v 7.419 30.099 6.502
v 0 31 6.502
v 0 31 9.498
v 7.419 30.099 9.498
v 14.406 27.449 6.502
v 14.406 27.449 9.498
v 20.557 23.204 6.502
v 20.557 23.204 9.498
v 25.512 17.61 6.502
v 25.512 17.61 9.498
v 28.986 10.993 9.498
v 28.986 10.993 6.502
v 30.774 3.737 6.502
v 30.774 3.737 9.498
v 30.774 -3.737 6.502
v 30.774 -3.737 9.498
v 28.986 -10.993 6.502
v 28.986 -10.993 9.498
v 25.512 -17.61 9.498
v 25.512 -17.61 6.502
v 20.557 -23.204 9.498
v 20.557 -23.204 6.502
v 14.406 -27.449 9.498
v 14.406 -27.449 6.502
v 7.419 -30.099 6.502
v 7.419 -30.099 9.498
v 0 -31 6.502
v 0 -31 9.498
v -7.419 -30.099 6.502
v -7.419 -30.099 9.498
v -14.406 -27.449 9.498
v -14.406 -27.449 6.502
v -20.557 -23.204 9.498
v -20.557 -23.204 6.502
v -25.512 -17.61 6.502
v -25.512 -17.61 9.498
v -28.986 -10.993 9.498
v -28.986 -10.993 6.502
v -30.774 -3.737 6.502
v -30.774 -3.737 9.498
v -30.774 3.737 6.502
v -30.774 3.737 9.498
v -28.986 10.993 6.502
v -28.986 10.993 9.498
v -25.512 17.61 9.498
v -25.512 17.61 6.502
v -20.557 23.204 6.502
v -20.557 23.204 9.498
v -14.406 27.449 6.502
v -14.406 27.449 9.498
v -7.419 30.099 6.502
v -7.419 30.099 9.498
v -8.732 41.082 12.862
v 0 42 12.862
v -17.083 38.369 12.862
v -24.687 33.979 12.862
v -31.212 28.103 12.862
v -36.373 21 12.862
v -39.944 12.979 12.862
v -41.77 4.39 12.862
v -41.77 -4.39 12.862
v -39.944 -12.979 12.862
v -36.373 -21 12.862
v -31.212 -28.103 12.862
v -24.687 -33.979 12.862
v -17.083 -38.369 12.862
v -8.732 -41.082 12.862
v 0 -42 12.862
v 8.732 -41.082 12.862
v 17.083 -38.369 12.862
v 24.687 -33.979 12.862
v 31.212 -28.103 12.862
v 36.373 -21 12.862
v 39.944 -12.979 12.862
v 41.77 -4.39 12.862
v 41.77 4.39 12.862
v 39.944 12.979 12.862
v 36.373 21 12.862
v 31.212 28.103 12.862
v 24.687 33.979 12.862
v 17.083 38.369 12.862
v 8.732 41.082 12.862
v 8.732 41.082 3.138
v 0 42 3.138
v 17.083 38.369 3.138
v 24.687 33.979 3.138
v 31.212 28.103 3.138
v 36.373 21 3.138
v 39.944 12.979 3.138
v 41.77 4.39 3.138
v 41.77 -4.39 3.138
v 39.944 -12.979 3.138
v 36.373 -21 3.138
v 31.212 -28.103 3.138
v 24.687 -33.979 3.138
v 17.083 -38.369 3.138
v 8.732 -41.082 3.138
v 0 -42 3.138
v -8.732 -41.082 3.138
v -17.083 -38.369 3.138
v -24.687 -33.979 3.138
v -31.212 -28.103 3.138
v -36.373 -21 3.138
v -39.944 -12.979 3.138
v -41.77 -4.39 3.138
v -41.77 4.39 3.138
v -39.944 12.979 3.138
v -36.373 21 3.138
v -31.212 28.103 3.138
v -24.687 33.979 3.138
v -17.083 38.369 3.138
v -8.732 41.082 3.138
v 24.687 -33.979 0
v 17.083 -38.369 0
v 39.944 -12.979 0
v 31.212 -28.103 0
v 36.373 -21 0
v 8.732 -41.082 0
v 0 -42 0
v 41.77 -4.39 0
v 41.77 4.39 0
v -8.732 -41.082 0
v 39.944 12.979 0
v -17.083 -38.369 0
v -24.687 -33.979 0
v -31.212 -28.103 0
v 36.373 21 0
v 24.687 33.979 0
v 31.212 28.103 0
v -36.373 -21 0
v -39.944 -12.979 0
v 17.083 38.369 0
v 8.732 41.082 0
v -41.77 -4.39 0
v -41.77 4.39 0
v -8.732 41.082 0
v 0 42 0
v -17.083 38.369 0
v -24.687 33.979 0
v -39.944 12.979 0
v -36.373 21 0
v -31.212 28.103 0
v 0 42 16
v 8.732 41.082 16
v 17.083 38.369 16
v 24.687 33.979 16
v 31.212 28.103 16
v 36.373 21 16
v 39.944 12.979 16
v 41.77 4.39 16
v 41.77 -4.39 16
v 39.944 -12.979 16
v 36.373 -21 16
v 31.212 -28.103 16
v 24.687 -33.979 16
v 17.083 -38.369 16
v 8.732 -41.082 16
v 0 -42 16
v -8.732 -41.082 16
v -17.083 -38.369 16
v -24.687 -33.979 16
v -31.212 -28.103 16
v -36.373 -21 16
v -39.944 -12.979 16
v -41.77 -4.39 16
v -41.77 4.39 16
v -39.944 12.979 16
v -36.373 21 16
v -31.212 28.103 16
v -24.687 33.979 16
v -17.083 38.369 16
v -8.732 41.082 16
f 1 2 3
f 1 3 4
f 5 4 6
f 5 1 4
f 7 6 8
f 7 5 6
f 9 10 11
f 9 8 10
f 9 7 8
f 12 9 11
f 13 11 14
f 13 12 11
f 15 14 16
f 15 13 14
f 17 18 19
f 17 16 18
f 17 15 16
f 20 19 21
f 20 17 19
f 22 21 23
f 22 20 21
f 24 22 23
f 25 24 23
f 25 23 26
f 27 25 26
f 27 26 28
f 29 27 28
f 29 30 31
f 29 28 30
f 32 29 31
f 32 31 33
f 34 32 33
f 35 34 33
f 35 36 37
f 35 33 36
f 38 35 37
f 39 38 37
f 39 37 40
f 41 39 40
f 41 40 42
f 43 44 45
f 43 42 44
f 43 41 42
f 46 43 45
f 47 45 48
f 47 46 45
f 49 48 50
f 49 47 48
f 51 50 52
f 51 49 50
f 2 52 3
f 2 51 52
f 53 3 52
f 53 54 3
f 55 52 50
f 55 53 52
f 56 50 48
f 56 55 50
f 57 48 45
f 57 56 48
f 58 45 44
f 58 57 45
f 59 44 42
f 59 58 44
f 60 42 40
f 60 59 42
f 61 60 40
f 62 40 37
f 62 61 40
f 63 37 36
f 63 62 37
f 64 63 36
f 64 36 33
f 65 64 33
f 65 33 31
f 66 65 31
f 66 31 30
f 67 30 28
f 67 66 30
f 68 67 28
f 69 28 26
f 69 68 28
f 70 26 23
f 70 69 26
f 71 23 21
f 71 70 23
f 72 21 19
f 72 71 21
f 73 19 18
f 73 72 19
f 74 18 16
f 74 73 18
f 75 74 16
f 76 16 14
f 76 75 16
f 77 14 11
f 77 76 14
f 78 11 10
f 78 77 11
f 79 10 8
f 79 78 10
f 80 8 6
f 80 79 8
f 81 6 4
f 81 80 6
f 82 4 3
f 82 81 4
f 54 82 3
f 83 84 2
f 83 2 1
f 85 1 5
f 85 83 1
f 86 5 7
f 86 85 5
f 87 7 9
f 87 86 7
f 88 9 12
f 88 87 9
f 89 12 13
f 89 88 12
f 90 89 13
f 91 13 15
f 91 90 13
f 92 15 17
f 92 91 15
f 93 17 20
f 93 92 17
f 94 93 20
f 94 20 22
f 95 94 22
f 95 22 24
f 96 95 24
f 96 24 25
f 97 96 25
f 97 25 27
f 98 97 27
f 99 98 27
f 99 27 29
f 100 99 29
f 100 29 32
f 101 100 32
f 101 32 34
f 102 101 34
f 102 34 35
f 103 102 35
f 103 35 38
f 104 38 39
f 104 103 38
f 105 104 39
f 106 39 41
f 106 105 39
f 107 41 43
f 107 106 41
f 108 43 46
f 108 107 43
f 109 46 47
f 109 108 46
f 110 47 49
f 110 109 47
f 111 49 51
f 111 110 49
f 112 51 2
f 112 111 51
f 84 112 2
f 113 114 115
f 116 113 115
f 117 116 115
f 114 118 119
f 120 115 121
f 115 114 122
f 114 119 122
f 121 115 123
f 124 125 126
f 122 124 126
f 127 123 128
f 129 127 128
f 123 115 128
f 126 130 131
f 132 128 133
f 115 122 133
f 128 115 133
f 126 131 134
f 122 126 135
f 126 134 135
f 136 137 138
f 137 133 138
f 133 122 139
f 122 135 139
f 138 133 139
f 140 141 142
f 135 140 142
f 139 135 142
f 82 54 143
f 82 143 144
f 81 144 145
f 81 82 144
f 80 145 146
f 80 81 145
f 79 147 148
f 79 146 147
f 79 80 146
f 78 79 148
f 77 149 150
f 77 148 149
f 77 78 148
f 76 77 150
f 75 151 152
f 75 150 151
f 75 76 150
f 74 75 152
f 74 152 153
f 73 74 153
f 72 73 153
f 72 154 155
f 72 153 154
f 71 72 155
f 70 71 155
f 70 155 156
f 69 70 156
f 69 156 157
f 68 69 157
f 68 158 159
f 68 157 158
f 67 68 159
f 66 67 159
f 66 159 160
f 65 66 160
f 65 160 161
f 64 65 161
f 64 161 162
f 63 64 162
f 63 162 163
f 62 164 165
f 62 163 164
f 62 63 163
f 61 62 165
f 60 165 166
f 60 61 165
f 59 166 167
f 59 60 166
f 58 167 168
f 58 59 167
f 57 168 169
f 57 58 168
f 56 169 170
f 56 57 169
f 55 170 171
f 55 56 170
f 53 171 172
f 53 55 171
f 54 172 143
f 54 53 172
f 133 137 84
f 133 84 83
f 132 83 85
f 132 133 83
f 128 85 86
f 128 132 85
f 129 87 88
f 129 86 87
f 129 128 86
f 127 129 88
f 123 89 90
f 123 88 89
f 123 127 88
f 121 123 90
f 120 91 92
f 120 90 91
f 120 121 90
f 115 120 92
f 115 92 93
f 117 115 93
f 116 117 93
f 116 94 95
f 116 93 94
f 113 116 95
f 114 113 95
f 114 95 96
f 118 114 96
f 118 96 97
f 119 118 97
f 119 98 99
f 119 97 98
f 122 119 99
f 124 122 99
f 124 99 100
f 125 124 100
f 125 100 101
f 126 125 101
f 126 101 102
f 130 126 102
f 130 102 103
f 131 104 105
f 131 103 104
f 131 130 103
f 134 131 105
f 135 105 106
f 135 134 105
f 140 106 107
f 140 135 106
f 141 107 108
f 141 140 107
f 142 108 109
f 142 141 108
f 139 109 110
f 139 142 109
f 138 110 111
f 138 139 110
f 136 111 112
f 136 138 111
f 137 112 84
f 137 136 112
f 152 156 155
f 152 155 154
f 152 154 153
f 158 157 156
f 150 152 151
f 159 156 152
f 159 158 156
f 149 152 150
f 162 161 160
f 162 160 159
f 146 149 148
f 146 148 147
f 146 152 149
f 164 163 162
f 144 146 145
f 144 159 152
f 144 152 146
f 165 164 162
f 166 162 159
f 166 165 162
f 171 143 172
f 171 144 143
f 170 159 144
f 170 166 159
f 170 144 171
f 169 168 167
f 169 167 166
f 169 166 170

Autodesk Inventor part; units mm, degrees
ref_plane "YZ Plane" through (0, 0, 0) normal (1, 0, 0) x (0, 1, 0)
ref_plane "XZ Plane" through (0, 0, 0) normal (0, 1, 0) x (-1, 0, 0)
sketch "Main Sketch" plane through (0, 0, 0) normal (1, 0, 0) x (0, 1, 0)
  line L0 (0, 16) -> (42, 16)
  line L1 (42, 16) -> (42, 12.8615)
  line L2 (42, 12.8615) -> (31, 9.4984)
  line L3 (31, 9.4984) -> (31, 6.5016)
  line L4 (31, 6.5016) -> (42, 3.1385)
  line L5 (42, 3.1385) -> (42, 0)
  line L6 (42, 0) -> (0, 0)
  line L7 (40, 12.25) -> (40, 3.75) construction
  line L8 (31, 8) -> (40, 8) construction
  line L9 (42, 12.8615) -> (42, 3.1385)
  line L10 (0, -4) -> (0, 24) projected
  line L11 (0, 0) -> (0, 16)
  dimension "d0" = 8.5
  dimension "d1" = 34
  dimension "d2" = 2
  dimension "d6" = 16
  dimension "d21" = 80
  dimension "d25" = 11
  dimension "d27" = 8
ref_plane "Belt Plane" through (0, 31, 8) normal (0, 0, 1) x (1, 0, 0)
revolve "Body" add sketch "Main Sketch" angle 360 about axis through (0, 0, -10) along (0, 0, 1)
revolve "Groove" cut sketch "Main Sketch" angle 360 about axis through (0, 0, -10) along (0, 0, 1) contours L9 L4 L3 L2
fillet "Fillet External" [suppressed]
fillet "Fillet Internal" [suppressed]
pattern_of_one "Groove Pattern"
equation "\"d0\" = da_Bw"
equation "\"d1\" = da_Alfa"
equation "\"d2\" = da_c"
equation "\"d21\" = da_Dw"
equation "\"d25\" = da_Hd"
equation "\"d27\" = da_Se"
equation "\"da_r1\" = 0"
equation "\"da_r2\" = 0"
equation "\"d18\" = da_Sg"
equation "\"d5\" = da_Se"
equation "\"da_Bw\" = 8.5"
equation "\"da_Alfa\" = 34deg"
equation "\"da_c\" = 2"
equation "\"da_Dw\" = 80"
equation "\"da_Hd\" = 11"
equation "\"da_Se\" = 8"
equation "\"da_Sg\" = 12"
properties part number "Grooved Pulley2" material "Steel"
